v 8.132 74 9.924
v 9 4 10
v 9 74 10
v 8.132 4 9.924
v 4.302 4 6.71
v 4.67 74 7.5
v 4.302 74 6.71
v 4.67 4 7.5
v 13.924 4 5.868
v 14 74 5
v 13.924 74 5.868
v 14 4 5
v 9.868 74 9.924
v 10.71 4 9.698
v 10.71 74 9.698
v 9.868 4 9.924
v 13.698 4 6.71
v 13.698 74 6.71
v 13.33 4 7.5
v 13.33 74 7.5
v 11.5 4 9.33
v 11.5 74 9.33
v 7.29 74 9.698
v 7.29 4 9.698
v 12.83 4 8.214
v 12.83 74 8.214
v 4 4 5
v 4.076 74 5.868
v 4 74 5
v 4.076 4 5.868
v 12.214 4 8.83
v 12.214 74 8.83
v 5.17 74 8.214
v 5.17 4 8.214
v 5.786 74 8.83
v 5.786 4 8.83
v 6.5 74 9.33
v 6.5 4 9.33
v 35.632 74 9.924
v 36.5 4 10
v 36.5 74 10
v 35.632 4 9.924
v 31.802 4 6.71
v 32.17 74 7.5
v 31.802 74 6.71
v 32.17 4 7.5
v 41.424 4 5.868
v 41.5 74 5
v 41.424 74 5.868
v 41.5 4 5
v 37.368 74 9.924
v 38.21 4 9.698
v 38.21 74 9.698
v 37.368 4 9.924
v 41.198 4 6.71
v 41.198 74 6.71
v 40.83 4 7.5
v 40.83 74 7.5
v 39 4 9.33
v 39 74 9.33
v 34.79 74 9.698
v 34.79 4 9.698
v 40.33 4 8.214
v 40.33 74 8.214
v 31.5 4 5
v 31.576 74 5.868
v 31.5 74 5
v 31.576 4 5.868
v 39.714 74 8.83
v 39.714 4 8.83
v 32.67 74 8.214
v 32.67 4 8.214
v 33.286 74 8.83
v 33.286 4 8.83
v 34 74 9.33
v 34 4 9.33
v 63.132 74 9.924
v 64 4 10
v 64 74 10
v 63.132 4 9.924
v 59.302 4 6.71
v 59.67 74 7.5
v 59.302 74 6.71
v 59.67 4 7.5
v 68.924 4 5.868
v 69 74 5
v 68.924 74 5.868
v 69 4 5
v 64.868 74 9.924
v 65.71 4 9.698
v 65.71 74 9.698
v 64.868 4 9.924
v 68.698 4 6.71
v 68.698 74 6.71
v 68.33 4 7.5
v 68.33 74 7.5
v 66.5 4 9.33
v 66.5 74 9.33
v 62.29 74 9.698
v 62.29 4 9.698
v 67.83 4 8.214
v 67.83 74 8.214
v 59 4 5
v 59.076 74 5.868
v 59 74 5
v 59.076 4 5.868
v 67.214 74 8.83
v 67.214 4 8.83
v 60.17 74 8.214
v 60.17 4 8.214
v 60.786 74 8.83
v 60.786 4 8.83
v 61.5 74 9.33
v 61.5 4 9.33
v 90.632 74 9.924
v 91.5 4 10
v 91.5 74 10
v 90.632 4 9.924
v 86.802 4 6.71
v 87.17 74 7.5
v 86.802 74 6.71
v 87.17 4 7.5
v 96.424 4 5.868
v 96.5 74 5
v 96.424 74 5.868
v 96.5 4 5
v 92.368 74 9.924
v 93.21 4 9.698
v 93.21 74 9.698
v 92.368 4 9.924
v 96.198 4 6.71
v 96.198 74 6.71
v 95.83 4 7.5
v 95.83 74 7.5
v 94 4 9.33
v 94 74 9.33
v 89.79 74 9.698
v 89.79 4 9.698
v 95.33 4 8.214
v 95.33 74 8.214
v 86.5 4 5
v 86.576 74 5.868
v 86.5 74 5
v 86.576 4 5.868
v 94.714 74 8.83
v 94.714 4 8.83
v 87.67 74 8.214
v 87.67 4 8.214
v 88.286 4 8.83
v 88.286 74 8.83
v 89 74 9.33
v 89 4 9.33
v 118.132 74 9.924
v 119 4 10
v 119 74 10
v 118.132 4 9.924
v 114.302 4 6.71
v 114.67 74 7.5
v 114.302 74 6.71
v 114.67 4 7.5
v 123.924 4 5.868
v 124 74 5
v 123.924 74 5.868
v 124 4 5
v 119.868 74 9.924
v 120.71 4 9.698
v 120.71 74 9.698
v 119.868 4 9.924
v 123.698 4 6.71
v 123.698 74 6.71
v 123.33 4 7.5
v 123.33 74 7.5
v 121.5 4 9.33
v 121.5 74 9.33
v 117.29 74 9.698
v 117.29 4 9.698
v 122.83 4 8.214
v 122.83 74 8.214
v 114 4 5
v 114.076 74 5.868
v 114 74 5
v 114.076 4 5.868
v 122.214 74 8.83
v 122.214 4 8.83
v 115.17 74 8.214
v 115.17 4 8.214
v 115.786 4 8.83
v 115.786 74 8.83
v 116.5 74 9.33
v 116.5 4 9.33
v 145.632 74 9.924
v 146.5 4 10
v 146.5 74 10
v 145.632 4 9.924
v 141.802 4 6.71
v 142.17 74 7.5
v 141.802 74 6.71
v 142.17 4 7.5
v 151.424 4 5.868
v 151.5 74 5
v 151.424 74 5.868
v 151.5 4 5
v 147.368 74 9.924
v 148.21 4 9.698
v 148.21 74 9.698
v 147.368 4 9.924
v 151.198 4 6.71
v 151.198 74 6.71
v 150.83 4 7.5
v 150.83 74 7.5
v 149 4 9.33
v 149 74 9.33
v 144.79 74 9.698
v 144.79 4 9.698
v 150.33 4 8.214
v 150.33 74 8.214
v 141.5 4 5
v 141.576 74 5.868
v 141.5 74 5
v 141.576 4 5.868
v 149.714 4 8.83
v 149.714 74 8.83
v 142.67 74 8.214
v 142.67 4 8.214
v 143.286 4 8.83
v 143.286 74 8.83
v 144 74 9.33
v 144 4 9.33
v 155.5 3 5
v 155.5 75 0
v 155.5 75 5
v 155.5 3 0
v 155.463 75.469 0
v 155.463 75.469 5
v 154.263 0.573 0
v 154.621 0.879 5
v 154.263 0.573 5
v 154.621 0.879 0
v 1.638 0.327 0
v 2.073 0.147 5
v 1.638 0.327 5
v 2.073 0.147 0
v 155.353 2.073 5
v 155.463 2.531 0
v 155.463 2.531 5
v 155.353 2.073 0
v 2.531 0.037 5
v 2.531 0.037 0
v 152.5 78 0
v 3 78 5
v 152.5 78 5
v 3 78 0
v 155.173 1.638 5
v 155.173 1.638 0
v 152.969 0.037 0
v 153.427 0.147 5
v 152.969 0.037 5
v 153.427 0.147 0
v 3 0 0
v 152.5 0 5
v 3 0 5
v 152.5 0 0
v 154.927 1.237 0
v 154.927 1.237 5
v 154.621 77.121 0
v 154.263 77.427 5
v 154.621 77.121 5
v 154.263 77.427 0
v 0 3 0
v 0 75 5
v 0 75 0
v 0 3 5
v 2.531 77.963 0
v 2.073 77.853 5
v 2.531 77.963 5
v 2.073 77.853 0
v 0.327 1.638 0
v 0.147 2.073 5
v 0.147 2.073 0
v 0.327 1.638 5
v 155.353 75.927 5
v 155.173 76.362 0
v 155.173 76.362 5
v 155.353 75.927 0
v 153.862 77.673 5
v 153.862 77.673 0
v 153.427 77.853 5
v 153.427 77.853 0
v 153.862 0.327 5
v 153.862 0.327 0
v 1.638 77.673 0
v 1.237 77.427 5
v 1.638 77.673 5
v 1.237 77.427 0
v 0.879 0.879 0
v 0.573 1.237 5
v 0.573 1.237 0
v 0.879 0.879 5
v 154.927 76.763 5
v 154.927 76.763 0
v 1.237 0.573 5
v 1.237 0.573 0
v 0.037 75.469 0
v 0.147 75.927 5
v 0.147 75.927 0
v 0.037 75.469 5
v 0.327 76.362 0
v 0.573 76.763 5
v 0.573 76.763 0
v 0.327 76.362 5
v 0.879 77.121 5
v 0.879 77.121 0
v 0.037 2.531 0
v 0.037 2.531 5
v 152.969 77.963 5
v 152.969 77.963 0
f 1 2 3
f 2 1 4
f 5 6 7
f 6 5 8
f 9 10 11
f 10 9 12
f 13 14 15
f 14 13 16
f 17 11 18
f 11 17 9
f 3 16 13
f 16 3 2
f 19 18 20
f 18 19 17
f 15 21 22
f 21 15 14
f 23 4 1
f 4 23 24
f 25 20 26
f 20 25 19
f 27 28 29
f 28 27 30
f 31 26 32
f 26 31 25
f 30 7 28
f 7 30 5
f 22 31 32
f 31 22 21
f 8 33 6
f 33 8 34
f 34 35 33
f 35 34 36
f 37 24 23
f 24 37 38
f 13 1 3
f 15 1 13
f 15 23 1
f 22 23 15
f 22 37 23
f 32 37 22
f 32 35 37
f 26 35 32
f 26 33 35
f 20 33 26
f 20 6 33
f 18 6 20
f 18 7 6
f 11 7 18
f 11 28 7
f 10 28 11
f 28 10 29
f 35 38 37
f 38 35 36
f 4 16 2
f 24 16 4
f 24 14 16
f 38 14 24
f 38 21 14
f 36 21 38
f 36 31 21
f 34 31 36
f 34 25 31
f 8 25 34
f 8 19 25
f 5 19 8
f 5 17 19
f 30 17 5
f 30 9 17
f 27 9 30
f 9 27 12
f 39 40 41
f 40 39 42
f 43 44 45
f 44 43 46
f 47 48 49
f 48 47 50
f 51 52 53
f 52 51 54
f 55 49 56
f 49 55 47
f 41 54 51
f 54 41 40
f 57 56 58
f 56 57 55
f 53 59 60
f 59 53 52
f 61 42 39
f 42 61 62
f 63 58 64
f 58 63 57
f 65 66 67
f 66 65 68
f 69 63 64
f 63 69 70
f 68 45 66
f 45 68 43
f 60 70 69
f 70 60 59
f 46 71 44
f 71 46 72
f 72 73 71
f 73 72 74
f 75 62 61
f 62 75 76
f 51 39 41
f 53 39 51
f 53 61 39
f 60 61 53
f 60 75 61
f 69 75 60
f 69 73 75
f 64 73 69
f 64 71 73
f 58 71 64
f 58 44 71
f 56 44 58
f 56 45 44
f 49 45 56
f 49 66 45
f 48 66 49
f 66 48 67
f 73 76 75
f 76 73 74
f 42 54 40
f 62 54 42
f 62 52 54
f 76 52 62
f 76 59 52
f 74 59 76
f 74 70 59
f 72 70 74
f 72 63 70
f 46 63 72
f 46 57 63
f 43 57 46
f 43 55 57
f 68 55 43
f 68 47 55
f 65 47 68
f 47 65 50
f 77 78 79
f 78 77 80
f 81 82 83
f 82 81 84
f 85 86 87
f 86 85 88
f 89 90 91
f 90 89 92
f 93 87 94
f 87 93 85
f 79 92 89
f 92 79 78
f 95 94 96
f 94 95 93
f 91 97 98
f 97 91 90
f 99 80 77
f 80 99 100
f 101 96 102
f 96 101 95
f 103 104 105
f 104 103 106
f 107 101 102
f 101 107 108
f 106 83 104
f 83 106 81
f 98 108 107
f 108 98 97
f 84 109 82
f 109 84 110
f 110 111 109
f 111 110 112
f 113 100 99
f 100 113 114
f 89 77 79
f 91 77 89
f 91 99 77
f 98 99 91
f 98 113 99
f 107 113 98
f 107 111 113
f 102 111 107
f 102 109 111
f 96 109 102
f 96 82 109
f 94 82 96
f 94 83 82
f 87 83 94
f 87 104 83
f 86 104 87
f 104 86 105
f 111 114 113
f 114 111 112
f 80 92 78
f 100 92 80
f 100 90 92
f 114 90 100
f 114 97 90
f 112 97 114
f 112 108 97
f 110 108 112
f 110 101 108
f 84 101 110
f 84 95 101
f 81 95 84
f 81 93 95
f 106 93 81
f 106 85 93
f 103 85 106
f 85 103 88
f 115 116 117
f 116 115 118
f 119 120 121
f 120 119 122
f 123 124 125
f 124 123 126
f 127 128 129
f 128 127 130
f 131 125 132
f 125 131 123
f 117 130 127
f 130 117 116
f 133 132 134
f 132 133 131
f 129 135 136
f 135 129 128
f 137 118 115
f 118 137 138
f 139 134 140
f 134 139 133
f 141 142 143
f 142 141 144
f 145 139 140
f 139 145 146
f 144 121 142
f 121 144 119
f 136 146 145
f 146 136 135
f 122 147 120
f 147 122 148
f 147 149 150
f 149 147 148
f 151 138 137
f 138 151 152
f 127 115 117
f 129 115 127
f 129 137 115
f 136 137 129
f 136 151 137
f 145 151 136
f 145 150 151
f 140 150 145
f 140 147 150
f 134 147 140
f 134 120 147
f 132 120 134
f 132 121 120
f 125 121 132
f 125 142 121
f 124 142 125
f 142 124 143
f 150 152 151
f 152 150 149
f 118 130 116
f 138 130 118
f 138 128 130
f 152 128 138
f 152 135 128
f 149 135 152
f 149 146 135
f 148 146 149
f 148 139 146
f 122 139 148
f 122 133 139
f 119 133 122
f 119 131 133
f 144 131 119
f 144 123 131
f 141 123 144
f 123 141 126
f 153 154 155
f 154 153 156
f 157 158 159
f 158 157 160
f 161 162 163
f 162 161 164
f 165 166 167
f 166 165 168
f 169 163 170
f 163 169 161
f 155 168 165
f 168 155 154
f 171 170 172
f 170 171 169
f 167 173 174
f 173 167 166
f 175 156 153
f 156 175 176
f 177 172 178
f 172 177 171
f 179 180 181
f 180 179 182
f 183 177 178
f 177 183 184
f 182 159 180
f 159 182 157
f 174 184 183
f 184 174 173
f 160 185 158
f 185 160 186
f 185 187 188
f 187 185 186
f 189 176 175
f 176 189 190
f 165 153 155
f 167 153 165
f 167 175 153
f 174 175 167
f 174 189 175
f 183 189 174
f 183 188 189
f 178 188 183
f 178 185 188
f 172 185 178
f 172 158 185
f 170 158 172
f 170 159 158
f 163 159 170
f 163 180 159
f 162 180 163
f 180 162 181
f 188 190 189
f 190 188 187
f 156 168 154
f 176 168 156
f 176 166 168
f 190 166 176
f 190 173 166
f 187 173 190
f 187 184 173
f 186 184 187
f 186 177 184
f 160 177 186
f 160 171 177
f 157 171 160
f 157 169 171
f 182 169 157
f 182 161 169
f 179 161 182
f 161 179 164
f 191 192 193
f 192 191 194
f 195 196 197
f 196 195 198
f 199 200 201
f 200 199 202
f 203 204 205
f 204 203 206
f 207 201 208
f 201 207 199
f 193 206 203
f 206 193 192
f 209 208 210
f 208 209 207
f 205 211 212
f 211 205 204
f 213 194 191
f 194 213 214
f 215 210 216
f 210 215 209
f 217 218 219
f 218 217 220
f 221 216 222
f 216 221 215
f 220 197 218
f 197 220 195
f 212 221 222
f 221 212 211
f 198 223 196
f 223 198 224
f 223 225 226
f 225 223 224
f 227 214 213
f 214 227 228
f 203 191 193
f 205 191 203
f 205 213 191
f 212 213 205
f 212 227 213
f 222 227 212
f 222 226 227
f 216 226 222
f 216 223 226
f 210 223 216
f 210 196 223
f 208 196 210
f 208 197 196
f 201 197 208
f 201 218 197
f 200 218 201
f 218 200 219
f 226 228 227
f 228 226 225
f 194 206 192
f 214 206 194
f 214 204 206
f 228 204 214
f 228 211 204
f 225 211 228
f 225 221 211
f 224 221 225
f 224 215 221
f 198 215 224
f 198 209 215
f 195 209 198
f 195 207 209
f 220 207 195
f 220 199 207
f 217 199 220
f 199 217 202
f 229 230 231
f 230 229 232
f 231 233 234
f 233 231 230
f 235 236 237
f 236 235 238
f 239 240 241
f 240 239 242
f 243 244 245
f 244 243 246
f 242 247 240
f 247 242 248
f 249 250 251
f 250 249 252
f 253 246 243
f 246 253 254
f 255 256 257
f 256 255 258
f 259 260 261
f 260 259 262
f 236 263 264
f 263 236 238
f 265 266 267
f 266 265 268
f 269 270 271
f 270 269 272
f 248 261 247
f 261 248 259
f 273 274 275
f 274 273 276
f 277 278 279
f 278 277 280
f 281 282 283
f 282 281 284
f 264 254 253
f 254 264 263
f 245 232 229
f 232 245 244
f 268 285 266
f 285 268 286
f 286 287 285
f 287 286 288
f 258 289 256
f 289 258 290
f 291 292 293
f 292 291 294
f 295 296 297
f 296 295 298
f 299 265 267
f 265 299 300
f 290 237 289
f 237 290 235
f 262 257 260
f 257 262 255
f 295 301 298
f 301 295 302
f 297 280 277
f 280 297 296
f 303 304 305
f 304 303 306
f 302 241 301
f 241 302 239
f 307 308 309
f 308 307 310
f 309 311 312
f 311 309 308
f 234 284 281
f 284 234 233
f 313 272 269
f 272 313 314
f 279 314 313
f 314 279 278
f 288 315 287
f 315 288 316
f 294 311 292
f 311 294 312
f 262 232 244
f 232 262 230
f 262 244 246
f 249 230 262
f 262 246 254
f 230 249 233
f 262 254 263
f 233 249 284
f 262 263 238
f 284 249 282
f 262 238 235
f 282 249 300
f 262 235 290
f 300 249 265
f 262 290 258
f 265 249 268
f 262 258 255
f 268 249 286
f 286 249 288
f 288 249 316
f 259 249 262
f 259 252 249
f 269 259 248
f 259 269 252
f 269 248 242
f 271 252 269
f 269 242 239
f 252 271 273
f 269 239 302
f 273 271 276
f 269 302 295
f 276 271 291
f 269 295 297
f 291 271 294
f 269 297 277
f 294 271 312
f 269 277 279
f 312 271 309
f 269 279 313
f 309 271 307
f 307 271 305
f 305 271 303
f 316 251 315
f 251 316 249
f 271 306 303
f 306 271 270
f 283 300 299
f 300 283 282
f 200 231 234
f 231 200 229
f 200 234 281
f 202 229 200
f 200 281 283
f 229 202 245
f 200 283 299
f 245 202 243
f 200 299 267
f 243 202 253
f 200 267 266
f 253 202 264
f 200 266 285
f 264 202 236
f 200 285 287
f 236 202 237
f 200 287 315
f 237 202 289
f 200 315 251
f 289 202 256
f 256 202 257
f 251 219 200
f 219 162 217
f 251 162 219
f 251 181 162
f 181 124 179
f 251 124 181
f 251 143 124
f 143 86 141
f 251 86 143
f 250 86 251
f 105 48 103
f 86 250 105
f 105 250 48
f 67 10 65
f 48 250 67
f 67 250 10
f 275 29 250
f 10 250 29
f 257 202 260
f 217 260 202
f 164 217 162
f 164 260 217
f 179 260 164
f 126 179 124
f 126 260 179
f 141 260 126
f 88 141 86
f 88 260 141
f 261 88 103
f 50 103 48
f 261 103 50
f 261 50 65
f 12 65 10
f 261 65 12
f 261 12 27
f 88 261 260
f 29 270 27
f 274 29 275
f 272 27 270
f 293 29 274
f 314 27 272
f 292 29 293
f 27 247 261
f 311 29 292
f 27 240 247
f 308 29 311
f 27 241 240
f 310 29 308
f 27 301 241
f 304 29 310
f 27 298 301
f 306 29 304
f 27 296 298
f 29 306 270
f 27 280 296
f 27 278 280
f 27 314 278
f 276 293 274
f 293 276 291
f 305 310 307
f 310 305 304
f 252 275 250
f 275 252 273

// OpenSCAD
// ============================================================
//  Cindi's Homeopathic Tube Organizer
//  Flat-base groove tray — tubes rest in valleys between ridges
// ============================================================
//  Open top · no walls · no cover
//  5 grooves keep tubes from rolling
//  Stack multiple trays in a drawer
//
//  HOW TO PRINT:
//    Open in OpenSCAD (free: openscad.org)
//    Press F6 → File → Export → Export as STL
//    Slicer: 20% infill, 2-3 walls, flat on bed, no supports
// ============================================================

// ── Tube size ────────────────────────────────────────────────
TUBE_D  = 16.5;   // tube outer diameter + ~1 mm clearance
TUBE_L  = 70.0;   // tube length + ~3 mm clearance
N_SLOTS = 5;      // number of tube slots

// ── Tray geometry ────────────────────────────────────────────
BASE_T  = 5.0;    // base plate thickness [mm]
R_RIDGE = 5.0;    // ridge radius — ridge height above base = R_RIDGE
MARGIN  = 4.0;    // extra border around outermost ridges
CORNER_R = 3.0;   // rounded corner radius

// ── Derived ──────────────────────────────────────────────────
VALLEY  = TUBE_D + 1.0;        // groove width (tube + a little breathing room)
PITCH   = VALLEY + 2*R_RIDGE;  // centre-to-centre ridge spacing
N_RIDGES = N_SLOTS + 1;        // one ridge on each side of every tube

x0     = MARGIN + R_RIDGE;     // first ridge centre X
tray_w = 2*MARGIN + 2*R_RIDGE + N_SLOTS * PITCH;
tray_l = 2*MARGIN + TUBE_L;

$fn = 40;

echo(str("Cindi's tray  W=", tray_w, " mm  L=", tray_l, " mm  H=", BASE_T+R_RIDGE, " mm"));

// ── Rounded rectangular base plate ───────────────────────────
module base_plate() {
    r = CORNER_R;
    hull() {
        translate([r,        r,        0]) cylinder(r=r, h=BASE_T);
        translate([tray_w-r, r,        0]) cylinder(r=r, h=BASE_T);
        translate([r,        tray_l-r, 0]) cylinder(r=r, h=BASE_T);
        translate([tray_w-r, tray_l-r, 0]) cylinder(r=r, h=BASE_T);
    }
}

// ── Full tray ─────────────────────────────────────────────────
module tray() {
    union() {
        base_plate();

        // Ridges — full cylinders centred at Z=BASE_T (so the
        // lower half is inside the base, upper half is the ridge)
        for (i = [0 : N_RIDGES - 1]) {
            cx = x0 + i * PITCH;
            translate([cx, MARGIN, BASE_T])
                rotate([-90, 0, 0])
                    cylinder(r=R_RIDGE, h=TUBE_L, $fn=36);
        }
    }
}

tray();
